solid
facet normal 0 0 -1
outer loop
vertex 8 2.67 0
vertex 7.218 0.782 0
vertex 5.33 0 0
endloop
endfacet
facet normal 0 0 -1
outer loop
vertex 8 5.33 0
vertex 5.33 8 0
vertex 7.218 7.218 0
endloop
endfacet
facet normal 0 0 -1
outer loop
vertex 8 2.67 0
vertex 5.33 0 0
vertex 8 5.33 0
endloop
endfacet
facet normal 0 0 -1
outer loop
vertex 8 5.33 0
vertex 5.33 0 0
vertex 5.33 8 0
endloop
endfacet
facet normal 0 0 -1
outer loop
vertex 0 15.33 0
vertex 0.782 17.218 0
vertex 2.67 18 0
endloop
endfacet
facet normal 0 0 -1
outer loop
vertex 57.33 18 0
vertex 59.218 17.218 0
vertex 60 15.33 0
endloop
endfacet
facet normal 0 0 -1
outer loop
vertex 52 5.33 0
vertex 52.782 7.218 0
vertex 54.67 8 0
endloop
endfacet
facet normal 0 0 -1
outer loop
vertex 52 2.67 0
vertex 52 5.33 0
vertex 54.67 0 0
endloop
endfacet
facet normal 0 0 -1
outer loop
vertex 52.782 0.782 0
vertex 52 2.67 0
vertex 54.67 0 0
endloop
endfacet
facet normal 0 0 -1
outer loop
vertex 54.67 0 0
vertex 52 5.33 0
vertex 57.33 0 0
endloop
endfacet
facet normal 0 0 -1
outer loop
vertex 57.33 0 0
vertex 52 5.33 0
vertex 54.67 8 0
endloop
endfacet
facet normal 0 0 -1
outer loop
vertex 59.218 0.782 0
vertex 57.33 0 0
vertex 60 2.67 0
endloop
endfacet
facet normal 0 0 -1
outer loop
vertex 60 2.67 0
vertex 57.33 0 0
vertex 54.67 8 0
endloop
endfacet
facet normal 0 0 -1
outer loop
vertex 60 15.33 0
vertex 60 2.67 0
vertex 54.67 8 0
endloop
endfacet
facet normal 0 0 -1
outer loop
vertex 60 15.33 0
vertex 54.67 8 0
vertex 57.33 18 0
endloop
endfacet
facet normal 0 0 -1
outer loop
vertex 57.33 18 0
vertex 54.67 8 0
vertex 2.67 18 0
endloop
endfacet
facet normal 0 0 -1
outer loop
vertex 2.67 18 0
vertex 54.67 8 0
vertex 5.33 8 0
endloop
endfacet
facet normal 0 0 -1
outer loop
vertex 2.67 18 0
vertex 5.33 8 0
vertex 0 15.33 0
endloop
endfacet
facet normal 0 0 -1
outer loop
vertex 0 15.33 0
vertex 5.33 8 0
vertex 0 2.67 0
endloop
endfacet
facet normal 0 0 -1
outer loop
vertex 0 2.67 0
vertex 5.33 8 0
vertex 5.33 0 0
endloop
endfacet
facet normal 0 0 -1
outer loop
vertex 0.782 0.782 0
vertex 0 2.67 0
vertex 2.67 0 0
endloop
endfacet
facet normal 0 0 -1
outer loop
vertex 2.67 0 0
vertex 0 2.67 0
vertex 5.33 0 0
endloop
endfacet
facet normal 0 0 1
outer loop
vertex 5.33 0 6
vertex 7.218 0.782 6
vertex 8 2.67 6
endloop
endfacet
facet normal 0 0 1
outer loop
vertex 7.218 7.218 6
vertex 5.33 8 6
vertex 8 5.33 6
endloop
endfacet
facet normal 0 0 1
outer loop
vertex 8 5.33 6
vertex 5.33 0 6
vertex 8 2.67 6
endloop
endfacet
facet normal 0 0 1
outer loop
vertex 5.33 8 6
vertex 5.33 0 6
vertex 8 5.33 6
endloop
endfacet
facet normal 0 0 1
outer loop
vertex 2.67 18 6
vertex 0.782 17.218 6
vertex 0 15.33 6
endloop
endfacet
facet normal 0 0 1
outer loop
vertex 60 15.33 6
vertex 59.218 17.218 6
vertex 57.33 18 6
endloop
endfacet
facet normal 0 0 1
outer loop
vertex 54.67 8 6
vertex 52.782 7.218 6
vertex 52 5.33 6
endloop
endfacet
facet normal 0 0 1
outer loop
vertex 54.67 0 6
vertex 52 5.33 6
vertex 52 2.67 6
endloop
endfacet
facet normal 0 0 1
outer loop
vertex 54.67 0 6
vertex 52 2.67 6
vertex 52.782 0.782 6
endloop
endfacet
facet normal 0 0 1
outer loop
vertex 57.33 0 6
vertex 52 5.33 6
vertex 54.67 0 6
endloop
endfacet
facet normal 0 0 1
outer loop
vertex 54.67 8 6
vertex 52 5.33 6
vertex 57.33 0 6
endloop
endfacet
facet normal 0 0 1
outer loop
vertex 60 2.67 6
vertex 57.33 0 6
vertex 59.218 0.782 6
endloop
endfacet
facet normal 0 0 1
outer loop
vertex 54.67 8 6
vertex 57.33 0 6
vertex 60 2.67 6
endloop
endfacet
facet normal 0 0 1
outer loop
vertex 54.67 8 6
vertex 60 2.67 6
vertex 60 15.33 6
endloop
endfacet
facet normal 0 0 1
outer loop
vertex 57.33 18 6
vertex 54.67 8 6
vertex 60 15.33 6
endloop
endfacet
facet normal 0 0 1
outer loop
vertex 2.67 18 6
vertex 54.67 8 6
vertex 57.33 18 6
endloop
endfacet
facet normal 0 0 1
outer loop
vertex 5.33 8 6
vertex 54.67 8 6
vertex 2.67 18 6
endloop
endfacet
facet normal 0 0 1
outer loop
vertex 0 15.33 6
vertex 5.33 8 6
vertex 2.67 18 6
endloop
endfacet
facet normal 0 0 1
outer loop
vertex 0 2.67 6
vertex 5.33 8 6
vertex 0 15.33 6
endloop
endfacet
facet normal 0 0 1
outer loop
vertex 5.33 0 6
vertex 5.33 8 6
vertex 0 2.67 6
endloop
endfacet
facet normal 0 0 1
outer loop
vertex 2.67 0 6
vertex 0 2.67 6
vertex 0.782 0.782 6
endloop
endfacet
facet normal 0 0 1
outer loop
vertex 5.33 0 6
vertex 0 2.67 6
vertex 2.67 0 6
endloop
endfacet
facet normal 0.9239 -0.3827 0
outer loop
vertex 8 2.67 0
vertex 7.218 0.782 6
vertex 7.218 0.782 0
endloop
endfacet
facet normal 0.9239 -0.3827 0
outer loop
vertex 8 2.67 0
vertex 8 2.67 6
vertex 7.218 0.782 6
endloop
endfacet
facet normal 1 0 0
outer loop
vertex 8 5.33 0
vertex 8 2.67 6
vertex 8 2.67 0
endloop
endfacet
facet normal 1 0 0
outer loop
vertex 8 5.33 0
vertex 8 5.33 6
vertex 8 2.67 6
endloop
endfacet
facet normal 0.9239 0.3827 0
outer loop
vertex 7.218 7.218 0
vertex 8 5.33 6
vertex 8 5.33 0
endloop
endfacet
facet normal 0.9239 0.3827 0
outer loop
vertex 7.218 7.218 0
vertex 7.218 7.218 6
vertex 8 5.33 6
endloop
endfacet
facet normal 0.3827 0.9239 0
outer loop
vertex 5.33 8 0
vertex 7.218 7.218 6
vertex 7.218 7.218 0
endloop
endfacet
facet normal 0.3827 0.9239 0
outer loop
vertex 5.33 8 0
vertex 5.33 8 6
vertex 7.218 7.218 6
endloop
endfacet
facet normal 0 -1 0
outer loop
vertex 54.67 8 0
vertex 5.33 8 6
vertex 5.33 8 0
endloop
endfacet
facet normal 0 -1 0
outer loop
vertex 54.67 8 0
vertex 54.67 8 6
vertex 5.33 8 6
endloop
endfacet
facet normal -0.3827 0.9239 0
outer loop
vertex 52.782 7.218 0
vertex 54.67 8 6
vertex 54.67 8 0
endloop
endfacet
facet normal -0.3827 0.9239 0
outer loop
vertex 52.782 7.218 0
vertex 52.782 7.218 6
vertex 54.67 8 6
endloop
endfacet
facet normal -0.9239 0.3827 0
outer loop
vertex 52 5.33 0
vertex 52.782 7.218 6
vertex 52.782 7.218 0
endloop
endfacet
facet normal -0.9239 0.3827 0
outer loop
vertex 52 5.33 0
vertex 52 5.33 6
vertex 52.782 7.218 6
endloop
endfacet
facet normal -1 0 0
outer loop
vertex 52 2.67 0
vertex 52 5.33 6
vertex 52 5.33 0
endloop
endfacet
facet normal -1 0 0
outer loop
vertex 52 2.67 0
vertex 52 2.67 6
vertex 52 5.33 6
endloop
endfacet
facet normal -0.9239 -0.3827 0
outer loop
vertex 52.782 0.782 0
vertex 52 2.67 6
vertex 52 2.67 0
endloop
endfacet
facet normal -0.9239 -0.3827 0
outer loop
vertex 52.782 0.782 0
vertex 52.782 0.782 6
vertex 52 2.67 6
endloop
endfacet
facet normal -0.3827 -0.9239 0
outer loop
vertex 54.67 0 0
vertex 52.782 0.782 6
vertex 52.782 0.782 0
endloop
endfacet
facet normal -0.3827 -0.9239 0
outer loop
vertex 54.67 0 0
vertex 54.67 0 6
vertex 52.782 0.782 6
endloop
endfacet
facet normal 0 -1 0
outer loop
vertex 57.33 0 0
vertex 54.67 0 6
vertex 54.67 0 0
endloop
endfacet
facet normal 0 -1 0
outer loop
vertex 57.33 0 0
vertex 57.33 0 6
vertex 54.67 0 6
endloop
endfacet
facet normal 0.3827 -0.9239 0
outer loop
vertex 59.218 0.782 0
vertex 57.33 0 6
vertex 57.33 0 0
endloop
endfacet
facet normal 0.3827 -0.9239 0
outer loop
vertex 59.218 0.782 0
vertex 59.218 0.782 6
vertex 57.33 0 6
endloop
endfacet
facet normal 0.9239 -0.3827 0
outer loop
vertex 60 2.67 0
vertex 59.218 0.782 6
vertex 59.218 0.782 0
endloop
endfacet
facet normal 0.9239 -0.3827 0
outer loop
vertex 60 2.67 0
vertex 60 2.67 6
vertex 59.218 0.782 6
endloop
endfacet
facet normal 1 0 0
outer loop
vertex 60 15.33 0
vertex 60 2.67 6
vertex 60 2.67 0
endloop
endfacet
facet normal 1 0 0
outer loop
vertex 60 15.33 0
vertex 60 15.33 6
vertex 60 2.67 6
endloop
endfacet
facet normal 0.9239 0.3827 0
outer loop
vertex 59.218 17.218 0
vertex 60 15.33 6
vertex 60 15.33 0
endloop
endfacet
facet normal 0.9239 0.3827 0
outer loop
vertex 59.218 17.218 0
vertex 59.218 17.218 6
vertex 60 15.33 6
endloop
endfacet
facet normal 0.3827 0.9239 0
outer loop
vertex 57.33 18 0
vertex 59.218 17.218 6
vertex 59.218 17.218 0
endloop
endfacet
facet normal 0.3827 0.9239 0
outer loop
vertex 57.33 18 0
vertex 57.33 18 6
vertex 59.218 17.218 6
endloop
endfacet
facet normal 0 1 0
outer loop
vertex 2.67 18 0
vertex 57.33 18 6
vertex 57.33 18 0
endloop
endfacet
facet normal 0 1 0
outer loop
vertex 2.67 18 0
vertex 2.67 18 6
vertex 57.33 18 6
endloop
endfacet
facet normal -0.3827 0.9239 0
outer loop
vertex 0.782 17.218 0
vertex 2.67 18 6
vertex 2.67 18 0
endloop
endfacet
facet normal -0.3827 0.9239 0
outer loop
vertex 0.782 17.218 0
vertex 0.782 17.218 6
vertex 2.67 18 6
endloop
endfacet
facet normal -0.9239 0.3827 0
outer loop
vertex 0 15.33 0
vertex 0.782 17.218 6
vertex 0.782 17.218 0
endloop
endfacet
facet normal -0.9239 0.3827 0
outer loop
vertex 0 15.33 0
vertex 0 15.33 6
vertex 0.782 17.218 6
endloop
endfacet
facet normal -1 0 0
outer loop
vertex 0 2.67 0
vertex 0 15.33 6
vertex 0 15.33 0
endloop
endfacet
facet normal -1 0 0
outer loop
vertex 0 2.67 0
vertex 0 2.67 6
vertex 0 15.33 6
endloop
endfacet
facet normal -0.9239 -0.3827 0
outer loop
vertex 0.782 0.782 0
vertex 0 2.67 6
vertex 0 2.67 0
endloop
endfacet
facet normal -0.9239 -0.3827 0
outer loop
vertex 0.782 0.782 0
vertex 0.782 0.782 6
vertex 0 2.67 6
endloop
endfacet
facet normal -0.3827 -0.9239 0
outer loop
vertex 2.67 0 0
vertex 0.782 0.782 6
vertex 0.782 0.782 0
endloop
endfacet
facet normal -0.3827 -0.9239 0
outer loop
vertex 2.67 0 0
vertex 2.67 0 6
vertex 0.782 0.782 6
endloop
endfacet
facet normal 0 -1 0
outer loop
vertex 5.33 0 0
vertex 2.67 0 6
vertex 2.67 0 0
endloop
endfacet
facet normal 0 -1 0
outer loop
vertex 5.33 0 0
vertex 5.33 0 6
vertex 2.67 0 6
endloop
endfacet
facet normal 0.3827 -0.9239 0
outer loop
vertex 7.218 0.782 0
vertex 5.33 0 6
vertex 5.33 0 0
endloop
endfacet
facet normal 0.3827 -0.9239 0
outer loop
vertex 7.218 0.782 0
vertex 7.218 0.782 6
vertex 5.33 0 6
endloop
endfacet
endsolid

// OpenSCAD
$fn = 32;

// ----------------------------------------------------------------------
// Clip blank: staple clip, 6 mm thick
// ----------------------------------------------------------------------

// --- parameters (mm) ---
profile_height = 6;       // extrusion height
profile_points = 24;      // points of the closed outline

profile = [[0, 2.67], [0.782, 0.782], [2.67, 0], [5.33, 0], [7.218, 0.782], [8, 2.67], [8, 5.33], [7.218, 7.218], [5.33, 8], [54.67, 8], [52.782, 7.218], [52, 5.33], [52, 2.67], [52.782, 0.782], [54.67, 0], [57.33, 0], [59.218, 0.782], [60, 2.67], [60, 15.33], [59.218, 17.218], [57.33, 18], [2.67, 18], [0.782, 17.218], [0, 15.33]];  // single closed polygon, 24 points, counter clockwise

// --- the one profile operation ---
linear_extrude(height = profile_height) polygon(points = profile);
